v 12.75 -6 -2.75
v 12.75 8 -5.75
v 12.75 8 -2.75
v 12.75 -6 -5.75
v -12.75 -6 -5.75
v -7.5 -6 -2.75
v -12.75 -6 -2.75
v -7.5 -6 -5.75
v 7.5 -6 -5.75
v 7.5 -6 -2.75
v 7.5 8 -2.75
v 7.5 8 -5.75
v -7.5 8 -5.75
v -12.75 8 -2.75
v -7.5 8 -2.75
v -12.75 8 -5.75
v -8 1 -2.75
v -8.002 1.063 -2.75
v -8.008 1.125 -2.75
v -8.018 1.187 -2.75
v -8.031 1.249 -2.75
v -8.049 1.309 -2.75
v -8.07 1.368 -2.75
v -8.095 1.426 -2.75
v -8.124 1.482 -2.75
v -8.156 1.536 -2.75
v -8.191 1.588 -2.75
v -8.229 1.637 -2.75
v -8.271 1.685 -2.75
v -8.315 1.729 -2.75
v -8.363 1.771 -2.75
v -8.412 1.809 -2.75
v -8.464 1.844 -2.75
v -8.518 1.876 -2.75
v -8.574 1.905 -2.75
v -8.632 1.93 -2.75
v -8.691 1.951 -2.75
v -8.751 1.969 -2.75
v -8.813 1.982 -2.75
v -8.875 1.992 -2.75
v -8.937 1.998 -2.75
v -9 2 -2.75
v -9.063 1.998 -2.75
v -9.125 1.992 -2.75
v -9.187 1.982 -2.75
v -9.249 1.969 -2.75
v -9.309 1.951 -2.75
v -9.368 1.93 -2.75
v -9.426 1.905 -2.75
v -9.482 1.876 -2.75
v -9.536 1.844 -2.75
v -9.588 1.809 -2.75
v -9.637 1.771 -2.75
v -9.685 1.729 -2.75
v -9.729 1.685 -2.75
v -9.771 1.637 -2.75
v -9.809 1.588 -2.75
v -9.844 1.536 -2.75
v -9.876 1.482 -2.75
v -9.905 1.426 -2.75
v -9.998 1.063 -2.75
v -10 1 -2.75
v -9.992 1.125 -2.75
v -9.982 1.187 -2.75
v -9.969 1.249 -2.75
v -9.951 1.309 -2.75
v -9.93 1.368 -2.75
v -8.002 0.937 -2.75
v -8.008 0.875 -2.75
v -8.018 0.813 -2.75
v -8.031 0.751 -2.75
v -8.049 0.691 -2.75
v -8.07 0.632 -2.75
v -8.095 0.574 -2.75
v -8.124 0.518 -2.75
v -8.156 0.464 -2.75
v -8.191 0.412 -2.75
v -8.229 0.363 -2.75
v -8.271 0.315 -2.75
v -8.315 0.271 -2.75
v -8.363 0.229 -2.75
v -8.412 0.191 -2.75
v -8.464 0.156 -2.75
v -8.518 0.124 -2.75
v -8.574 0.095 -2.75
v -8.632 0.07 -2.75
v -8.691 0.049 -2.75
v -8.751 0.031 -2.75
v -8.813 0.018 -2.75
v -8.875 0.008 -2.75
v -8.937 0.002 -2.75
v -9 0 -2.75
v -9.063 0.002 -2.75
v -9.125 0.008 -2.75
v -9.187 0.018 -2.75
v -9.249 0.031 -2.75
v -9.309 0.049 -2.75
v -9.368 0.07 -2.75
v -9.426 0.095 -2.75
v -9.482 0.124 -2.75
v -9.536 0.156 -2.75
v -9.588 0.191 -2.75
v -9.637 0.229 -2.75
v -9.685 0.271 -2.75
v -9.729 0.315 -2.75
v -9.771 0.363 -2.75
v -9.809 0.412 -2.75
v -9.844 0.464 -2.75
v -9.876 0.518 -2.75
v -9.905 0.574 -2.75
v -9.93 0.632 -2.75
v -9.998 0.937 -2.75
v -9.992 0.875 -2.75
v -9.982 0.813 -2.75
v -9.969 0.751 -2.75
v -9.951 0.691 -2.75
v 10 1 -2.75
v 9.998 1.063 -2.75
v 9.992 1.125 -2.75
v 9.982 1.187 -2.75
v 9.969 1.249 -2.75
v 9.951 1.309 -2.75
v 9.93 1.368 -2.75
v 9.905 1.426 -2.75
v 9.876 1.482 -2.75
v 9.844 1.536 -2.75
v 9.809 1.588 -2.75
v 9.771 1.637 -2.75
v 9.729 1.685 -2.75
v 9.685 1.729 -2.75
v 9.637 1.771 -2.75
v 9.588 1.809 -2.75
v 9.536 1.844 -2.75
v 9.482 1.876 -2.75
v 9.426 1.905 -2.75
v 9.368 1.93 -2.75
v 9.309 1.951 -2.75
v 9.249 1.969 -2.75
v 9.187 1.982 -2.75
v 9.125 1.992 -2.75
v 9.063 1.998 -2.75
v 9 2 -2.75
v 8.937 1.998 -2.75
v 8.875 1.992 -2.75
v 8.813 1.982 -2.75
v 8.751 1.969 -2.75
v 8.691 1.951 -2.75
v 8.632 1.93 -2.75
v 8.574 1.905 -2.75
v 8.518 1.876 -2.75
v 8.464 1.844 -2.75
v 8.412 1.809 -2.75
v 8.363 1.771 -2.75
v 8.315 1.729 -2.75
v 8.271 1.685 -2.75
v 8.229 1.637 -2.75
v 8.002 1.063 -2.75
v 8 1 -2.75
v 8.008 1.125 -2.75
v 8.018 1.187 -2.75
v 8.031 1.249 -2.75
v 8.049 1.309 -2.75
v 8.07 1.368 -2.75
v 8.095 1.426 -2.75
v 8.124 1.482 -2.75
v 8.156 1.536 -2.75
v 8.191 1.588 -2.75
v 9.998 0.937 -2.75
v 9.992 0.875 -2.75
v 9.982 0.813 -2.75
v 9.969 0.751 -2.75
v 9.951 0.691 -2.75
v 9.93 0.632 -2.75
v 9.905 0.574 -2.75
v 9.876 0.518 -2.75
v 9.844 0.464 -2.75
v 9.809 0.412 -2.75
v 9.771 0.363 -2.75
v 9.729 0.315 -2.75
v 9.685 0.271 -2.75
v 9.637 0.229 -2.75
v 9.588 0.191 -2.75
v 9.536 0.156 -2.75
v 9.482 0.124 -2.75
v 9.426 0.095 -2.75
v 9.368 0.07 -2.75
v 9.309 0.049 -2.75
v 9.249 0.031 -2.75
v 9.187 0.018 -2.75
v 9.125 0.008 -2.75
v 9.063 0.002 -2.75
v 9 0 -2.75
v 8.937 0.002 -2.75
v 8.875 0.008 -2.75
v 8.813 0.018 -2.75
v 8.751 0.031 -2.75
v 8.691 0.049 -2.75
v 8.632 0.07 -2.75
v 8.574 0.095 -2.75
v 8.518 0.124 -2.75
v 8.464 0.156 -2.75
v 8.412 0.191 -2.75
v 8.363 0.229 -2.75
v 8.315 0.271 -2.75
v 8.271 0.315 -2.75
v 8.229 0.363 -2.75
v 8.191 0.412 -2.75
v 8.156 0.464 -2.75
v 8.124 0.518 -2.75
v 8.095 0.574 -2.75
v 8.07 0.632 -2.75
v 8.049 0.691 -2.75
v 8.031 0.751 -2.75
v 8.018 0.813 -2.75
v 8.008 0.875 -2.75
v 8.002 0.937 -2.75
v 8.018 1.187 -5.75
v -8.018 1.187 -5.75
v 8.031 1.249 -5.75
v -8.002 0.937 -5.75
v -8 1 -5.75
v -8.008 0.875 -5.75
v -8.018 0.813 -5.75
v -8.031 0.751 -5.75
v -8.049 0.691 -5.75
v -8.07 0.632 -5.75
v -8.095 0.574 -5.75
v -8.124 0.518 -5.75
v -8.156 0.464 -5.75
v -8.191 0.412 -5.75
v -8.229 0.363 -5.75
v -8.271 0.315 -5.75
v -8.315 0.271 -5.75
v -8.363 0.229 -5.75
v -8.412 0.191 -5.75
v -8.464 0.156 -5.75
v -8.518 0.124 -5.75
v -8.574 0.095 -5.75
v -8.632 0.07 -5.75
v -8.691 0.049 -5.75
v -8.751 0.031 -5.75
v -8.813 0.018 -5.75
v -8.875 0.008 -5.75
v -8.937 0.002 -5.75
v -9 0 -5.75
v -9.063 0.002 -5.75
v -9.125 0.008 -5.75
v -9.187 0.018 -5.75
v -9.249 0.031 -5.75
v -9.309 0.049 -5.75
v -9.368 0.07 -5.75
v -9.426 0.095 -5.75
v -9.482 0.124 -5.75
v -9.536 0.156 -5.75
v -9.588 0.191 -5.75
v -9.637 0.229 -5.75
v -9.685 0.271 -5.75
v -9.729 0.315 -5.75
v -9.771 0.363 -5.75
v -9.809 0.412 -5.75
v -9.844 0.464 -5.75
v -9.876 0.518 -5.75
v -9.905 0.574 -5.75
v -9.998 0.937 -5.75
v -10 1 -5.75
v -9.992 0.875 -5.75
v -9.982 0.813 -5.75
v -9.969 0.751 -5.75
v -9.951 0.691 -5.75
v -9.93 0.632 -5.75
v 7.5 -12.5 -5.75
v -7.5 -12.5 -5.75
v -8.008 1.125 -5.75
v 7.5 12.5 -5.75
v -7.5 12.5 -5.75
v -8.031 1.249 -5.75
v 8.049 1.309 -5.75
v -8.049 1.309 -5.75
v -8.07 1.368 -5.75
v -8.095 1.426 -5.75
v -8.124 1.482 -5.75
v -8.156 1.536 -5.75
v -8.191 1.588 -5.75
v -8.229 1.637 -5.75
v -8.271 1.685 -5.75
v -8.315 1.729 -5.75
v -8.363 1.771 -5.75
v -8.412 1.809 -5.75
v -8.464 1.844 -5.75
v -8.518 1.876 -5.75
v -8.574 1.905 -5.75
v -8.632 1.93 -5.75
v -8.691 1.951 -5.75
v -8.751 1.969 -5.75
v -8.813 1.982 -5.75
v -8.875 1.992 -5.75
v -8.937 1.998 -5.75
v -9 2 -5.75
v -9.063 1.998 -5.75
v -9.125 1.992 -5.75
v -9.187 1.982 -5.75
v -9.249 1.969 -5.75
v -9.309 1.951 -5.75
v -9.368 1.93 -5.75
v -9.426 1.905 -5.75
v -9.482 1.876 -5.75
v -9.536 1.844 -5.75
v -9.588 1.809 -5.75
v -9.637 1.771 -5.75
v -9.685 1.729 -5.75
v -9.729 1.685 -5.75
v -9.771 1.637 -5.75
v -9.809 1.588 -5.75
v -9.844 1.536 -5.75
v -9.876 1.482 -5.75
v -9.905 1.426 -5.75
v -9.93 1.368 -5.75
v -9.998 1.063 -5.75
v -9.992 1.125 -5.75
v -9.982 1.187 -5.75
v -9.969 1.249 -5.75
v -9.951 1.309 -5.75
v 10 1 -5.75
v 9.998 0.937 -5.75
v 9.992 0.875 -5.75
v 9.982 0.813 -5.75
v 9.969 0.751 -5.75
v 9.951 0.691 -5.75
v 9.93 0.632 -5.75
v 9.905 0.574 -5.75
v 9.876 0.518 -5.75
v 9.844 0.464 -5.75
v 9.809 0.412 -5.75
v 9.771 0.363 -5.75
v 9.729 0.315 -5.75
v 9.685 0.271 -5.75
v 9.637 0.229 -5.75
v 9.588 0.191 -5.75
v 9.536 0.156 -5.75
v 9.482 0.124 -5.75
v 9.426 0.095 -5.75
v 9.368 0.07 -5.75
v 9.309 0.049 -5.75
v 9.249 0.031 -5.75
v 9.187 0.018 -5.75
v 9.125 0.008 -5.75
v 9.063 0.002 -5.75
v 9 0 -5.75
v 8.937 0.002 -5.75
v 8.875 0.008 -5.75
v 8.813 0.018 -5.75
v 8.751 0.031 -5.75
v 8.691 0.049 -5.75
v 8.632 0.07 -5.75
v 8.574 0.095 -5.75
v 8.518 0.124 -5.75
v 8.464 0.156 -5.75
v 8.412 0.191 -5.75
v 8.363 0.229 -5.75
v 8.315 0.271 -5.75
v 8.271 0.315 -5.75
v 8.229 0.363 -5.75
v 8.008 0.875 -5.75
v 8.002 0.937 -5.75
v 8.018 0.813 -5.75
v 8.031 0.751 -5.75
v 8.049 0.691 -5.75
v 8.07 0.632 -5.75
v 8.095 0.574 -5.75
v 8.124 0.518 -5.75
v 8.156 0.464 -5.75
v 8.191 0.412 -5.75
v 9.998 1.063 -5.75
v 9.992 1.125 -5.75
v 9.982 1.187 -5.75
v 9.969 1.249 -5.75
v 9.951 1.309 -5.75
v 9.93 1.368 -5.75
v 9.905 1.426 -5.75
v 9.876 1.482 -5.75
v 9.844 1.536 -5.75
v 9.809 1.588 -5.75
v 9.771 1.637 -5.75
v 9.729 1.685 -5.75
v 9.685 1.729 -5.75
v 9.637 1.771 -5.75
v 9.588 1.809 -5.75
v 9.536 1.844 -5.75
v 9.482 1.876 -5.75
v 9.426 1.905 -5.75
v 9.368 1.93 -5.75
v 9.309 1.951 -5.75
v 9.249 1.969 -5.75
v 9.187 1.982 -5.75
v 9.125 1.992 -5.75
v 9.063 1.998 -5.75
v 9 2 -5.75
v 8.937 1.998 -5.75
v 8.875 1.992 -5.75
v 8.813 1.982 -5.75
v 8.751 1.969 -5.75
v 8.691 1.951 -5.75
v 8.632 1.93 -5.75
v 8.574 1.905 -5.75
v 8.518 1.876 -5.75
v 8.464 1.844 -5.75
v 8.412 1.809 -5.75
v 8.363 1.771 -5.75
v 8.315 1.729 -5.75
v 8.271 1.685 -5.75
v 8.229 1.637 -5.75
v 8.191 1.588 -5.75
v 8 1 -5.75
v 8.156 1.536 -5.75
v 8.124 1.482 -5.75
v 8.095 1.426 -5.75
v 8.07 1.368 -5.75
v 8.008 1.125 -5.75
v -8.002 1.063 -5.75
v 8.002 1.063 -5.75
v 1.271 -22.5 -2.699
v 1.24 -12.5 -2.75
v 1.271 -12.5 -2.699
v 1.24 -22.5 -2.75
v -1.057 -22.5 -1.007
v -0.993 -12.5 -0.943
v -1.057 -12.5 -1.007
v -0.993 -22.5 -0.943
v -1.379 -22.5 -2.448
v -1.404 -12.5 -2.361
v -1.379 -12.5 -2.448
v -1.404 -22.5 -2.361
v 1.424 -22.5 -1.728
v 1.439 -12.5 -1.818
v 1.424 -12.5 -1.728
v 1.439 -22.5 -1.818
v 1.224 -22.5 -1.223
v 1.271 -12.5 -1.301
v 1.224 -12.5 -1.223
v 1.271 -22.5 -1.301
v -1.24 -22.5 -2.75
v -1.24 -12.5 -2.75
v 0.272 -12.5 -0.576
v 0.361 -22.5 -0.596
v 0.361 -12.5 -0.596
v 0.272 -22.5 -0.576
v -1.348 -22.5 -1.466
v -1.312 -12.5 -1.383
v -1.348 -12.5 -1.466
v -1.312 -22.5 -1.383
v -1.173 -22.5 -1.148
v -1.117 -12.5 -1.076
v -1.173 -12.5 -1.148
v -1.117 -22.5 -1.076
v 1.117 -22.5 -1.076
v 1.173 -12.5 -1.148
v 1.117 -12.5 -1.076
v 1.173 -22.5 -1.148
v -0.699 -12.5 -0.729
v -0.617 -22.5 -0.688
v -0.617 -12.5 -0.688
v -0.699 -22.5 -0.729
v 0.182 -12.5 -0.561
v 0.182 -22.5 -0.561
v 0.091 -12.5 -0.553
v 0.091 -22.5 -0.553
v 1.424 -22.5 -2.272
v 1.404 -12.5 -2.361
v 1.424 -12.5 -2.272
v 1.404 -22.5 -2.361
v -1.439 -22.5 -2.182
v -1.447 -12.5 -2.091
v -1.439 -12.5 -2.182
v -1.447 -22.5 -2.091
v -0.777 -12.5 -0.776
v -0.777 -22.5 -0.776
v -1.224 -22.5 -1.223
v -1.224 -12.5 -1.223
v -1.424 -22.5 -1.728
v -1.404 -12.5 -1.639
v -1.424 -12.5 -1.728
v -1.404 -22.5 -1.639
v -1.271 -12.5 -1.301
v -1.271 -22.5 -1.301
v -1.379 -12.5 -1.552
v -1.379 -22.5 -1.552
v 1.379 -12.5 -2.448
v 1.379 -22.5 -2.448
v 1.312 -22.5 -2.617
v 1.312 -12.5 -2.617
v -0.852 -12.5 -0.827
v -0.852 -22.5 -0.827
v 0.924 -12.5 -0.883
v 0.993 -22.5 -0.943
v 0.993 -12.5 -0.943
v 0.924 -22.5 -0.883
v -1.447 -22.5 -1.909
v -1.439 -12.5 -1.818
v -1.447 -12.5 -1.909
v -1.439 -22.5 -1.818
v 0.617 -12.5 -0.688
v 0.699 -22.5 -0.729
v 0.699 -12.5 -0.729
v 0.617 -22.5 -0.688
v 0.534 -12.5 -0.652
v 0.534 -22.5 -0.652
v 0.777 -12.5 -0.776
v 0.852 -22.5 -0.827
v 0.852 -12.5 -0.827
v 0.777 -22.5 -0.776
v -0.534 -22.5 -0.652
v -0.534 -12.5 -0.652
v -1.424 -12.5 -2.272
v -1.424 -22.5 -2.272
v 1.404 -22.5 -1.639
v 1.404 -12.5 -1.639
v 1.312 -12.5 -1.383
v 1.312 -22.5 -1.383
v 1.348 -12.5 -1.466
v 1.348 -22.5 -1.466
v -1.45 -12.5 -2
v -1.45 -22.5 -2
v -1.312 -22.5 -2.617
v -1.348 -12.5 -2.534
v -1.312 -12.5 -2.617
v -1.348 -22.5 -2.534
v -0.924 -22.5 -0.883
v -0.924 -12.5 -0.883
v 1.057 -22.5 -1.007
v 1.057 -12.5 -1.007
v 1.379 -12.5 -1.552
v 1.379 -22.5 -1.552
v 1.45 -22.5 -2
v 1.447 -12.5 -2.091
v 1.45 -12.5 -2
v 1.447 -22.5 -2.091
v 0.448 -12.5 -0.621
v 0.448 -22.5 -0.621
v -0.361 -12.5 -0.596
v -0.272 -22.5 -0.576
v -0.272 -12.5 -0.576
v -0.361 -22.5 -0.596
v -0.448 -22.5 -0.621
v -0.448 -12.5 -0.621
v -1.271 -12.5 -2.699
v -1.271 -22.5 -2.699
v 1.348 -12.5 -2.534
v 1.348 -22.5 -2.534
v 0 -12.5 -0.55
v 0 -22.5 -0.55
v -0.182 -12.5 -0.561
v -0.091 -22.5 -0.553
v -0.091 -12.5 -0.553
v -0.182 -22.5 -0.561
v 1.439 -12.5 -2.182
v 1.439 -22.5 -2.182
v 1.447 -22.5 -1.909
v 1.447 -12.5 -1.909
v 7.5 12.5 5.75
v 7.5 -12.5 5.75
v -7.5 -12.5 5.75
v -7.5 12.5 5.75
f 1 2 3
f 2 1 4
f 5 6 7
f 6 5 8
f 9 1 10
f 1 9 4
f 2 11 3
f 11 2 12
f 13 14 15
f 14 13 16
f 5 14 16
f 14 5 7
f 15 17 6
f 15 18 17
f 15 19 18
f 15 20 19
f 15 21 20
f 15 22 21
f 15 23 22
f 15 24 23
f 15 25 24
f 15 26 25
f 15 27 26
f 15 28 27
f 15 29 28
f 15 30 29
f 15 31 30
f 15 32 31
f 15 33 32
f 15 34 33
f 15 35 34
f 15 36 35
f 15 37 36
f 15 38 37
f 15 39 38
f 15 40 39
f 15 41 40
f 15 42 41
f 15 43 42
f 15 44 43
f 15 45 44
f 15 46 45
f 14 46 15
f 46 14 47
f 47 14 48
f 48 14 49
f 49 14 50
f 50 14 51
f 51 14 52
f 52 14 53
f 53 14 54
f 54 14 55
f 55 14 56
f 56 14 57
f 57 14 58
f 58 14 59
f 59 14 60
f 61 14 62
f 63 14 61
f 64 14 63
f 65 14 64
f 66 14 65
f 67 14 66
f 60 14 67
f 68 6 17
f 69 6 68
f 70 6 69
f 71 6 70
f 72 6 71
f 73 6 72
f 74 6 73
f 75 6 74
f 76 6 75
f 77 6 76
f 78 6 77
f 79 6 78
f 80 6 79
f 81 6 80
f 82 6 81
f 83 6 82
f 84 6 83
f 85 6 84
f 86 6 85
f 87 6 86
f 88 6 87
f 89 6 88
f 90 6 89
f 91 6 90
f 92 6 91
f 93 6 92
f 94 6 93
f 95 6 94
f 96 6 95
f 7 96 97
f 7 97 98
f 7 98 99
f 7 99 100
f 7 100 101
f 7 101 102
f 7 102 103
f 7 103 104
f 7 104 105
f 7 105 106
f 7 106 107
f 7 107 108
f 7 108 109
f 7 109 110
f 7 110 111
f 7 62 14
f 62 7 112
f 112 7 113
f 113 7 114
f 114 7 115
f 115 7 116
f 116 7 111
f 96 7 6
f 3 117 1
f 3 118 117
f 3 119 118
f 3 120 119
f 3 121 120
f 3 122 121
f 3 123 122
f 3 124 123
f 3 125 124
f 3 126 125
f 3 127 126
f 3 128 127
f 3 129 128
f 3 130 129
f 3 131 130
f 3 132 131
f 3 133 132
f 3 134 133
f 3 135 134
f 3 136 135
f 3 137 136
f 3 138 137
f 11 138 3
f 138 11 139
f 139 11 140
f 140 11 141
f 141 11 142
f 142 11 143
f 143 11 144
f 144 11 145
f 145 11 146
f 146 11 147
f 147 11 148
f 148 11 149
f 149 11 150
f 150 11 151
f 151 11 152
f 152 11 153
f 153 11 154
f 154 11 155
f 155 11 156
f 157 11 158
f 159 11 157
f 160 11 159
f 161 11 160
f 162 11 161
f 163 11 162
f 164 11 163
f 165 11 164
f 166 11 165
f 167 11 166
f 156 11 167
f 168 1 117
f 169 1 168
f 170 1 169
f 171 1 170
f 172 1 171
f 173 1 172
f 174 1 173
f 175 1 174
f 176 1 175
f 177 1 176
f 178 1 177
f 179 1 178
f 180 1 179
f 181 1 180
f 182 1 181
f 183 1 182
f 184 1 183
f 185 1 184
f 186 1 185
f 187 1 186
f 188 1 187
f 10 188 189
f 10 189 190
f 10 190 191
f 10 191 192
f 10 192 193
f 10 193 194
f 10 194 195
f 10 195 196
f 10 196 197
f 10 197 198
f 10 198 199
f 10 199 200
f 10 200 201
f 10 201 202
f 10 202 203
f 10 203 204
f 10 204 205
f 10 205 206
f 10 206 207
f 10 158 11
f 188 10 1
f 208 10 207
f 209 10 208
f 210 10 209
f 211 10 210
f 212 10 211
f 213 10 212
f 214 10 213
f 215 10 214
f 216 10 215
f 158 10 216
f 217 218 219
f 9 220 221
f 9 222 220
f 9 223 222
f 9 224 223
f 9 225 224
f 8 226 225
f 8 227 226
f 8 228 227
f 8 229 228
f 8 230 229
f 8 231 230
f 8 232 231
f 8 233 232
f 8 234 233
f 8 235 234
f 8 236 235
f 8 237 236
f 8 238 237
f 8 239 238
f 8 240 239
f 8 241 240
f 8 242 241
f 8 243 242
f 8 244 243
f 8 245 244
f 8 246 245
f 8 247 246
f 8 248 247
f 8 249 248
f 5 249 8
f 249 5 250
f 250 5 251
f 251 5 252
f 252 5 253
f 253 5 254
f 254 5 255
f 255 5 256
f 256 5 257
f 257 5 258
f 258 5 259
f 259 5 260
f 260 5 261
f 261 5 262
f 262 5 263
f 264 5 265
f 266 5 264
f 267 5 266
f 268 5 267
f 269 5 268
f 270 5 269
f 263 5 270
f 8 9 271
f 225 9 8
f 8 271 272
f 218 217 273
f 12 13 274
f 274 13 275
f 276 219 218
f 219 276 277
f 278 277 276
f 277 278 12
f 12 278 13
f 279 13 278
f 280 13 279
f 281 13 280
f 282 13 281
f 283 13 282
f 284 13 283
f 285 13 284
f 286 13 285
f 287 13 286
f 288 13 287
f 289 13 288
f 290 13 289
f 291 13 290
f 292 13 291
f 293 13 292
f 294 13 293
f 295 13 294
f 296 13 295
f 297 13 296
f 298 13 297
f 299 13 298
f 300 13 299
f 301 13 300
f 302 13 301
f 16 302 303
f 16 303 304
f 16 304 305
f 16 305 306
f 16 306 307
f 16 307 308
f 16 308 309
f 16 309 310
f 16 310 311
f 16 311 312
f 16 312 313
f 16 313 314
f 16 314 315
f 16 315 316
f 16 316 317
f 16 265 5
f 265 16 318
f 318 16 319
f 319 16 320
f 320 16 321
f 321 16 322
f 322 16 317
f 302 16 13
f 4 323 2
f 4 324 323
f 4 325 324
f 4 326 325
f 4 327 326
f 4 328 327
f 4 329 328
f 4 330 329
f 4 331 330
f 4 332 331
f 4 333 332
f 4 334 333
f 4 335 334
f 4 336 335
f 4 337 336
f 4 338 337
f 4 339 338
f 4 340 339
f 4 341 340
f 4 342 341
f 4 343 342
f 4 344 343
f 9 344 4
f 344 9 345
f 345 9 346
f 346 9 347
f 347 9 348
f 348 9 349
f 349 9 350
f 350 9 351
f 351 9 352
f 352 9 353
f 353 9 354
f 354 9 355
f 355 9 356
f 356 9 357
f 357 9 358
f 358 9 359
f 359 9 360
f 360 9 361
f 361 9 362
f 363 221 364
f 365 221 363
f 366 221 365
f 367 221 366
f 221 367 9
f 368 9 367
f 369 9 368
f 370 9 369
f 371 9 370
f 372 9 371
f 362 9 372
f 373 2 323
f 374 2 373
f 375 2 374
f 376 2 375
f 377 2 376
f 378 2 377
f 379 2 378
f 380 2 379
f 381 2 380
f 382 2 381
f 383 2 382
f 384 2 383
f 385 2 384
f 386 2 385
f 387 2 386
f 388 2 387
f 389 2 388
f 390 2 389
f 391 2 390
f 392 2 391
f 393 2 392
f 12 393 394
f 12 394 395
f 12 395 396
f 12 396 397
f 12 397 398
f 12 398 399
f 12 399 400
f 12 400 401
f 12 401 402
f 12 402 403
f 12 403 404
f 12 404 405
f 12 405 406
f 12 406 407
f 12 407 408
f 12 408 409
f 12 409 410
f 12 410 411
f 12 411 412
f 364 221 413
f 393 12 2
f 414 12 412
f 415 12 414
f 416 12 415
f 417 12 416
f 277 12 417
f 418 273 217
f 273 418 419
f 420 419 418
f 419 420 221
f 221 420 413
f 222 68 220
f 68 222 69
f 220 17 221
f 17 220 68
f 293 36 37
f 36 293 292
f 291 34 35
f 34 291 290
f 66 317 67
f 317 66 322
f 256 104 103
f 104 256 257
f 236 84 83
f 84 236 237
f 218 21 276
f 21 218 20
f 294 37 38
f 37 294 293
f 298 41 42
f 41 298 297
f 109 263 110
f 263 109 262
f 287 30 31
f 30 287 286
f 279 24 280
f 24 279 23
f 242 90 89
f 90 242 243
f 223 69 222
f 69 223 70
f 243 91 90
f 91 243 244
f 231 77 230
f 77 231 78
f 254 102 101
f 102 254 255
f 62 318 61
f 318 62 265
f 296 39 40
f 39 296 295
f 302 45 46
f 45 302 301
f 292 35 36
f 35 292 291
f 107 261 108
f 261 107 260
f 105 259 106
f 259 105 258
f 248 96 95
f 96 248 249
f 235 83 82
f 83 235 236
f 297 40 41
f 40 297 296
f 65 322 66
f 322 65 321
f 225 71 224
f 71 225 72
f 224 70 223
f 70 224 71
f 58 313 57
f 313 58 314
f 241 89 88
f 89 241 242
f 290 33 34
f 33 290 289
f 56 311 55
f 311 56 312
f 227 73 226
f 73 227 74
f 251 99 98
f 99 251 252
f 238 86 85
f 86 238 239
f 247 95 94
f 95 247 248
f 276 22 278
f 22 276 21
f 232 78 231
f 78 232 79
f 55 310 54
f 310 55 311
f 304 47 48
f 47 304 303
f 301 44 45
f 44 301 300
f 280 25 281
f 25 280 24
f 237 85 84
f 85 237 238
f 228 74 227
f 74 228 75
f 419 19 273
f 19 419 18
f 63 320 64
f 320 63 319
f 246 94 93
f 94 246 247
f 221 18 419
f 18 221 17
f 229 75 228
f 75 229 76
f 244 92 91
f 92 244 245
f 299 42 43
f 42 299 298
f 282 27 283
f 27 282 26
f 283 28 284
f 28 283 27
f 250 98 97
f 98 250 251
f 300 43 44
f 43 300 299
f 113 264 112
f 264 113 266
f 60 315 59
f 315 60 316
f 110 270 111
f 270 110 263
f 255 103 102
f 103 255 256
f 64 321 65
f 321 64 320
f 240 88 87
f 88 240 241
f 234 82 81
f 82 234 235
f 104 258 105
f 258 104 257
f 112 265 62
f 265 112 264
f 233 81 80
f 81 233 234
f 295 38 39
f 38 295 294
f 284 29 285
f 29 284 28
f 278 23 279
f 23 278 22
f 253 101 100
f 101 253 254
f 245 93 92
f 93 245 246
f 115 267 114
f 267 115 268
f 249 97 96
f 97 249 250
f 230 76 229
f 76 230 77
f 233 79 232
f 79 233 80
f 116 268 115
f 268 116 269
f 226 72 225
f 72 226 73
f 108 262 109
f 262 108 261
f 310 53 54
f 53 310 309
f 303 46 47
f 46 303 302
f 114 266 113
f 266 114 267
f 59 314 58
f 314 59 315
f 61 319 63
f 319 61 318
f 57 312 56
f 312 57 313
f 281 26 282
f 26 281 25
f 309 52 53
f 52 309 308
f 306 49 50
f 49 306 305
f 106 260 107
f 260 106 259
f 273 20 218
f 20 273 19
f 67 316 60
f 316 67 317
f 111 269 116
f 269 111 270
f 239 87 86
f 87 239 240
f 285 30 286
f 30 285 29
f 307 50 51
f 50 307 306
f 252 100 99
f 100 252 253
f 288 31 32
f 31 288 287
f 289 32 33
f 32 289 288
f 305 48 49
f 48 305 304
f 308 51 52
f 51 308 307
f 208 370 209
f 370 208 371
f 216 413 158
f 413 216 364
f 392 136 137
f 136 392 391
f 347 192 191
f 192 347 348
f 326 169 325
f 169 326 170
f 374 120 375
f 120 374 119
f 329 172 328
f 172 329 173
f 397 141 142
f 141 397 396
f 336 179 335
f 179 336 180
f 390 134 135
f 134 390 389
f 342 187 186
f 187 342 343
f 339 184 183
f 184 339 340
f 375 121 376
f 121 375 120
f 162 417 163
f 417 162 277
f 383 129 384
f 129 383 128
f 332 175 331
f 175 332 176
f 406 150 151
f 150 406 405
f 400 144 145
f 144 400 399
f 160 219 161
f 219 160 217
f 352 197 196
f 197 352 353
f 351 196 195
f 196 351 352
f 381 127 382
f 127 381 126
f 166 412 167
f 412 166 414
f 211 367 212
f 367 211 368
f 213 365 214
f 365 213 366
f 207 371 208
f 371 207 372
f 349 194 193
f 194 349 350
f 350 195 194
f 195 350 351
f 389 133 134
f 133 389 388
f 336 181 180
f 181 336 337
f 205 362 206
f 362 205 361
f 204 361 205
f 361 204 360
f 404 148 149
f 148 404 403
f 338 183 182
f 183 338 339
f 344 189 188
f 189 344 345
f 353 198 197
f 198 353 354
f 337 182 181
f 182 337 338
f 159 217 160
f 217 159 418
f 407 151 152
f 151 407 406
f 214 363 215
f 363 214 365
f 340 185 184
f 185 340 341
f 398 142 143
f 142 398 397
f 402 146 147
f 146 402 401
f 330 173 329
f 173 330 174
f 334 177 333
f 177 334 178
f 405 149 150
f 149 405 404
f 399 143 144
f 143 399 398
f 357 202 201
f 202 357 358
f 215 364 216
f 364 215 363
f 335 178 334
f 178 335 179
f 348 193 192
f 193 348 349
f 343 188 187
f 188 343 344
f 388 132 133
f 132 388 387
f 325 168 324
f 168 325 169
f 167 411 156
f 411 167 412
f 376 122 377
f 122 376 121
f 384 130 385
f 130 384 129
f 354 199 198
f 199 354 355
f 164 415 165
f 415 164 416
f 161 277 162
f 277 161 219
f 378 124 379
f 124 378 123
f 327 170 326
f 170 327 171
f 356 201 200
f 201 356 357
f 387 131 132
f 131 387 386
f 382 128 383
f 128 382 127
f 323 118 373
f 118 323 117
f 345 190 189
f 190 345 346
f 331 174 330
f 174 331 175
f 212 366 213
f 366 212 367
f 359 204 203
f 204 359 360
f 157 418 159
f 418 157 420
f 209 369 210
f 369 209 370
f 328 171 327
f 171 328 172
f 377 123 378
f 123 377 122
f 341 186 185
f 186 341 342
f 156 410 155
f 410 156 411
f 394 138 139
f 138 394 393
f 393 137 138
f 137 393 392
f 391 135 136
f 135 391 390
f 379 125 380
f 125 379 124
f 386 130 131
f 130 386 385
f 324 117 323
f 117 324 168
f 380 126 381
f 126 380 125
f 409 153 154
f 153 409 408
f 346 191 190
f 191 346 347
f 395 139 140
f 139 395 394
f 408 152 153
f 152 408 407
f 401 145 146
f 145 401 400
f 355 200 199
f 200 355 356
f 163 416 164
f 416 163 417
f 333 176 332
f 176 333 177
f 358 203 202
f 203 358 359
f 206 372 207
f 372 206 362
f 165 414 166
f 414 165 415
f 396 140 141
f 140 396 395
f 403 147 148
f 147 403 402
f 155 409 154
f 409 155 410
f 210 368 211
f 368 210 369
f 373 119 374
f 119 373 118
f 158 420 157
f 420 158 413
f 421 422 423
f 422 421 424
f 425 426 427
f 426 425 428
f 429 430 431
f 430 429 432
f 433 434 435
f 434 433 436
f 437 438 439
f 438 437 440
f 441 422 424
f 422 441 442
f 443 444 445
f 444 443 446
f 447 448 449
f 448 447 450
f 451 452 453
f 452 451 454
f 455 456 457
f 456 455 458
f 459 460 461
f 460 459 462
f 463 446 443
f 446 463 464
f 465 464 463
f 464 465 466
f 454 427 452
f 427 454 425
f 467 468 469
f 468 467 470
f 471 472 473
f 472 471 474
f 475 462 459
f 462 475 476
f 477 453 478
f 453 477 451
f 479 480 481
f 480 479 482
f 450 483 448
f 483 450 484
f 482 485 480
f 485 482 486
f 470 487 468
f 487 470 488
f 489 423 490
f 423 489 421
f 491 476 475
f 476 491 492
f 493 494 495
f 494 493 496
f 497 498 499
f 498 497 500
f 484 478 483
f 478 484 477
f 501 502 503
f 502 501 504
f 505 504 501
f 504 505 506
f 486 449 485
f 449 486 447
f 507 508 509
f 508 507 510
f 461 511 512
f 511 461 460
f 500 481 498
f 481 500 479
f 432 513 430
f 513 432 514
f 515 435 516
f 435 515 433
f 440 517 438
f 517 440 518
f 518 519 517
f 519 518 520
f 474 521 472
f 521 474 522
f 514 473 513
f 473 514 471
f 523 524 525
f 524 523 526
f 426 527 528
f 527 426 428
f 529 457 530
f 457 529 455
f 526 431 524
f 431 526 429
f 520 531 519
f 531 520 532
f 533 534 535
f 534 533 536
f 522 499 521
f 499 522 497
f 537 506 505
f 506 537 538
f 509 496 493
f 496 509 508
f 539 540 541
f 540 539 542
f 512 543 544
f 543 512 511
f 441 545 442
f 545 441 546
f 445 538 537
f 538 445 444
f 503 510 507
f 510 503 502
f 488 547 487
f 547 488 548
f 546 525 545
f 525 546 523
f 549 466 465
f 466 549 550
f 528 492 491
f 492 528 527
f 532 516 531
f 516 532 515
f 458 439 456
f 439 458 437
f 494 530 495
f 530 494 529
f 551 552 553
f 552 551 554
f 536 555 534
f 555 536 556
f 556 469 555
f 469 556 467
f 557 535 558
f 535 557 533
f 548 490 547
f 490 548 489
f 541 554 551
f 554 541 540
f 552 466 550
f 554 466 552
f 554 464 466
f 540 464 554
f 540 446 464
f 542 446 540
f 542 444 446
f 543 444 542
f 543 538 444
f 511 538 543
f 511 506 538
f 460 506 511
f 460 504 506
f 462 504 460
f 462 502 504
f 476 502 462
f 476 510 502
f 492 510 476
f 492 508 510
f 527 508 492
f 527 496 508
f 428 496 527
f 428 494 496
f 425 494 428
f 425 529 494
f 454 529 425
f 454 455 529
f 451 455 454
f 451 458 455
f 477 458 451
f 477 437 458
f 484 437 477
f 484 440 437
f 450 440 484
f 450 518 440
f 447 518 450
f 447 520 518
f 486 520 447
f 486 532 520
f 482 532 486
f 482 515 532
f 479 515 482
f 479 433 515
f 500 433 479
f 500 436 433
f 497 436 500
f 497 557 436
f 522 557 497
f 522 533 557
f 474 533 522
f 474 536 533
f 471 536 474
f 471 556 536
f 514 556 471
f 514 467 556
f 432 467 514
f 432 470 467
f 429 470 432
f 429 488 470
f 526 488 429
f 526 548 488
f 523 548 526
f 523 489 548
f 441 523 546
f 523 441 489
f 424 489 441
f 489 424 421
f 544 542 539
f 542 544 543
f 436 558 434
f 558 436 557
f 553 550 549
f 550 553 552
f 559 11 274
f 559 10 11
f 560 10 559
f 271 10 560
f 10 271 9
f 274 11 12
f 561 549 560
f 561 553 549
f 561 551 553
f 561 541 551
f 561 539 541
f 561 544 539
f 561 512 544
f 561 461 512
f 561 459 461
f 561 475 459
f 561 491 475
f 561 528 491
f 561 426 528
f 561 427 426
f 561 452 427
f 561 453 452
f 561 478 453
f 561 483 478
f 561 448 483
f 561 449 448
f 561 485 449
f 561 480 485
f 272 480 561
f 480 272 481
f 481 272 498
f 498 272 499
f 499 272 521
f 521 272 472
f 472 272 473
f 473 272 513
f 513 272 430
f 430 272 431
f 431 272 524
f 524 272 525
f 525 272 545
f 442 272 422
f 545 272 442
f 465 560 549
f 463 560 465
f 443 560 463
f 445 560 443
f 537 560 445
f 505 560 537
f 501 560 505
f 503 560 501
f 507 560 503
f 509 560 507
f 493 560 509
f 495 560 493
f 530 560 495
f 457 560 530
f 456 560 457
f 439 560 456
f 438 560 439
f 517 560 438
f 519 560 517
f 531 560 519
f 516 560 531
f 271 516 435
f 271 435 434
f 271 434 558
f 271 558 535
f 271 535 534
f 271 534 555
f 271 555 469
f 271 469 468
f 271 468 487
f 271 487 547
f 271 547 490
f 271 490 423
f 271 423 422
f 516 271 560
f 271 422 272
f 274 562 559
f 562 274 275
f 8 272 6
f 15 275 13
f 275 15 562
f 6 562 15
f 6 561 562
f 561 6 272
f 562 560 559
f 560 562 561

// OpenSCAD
//rueda Pololu
module motorPololu(resoluciOn=100){

rotate([90,0,0])
union(){
translate([0,-2,(25/2)-2])
linear_extrude(height=12)
difference(){
    circle(r=(3-0.1)/2,$fn=resoluciOn);
    translate([0,-((3-0.1)/2+(1/2))+0.6+0.1])
    square([3,1],center=true);    
   }

cube([15,11.5,25],center=true);

translate([0,-11.5/2+1.5,-1])
difference(){   
cube([25.5,3,14],center=true);
    
translate([-9,0,0])
rotate([90,0,0])
cylinder(r=1,$fn=100,h=6,center=true);
    
mirror([1,0,0]){
   translate([-9,0,0])
rotate([90,0,0])
cylinder(r=1,$fn=100,h=6,center=true);   
}

}
}//fin union

}//fin motorPololu



//translate([0,-1,9])
motorPololu();
